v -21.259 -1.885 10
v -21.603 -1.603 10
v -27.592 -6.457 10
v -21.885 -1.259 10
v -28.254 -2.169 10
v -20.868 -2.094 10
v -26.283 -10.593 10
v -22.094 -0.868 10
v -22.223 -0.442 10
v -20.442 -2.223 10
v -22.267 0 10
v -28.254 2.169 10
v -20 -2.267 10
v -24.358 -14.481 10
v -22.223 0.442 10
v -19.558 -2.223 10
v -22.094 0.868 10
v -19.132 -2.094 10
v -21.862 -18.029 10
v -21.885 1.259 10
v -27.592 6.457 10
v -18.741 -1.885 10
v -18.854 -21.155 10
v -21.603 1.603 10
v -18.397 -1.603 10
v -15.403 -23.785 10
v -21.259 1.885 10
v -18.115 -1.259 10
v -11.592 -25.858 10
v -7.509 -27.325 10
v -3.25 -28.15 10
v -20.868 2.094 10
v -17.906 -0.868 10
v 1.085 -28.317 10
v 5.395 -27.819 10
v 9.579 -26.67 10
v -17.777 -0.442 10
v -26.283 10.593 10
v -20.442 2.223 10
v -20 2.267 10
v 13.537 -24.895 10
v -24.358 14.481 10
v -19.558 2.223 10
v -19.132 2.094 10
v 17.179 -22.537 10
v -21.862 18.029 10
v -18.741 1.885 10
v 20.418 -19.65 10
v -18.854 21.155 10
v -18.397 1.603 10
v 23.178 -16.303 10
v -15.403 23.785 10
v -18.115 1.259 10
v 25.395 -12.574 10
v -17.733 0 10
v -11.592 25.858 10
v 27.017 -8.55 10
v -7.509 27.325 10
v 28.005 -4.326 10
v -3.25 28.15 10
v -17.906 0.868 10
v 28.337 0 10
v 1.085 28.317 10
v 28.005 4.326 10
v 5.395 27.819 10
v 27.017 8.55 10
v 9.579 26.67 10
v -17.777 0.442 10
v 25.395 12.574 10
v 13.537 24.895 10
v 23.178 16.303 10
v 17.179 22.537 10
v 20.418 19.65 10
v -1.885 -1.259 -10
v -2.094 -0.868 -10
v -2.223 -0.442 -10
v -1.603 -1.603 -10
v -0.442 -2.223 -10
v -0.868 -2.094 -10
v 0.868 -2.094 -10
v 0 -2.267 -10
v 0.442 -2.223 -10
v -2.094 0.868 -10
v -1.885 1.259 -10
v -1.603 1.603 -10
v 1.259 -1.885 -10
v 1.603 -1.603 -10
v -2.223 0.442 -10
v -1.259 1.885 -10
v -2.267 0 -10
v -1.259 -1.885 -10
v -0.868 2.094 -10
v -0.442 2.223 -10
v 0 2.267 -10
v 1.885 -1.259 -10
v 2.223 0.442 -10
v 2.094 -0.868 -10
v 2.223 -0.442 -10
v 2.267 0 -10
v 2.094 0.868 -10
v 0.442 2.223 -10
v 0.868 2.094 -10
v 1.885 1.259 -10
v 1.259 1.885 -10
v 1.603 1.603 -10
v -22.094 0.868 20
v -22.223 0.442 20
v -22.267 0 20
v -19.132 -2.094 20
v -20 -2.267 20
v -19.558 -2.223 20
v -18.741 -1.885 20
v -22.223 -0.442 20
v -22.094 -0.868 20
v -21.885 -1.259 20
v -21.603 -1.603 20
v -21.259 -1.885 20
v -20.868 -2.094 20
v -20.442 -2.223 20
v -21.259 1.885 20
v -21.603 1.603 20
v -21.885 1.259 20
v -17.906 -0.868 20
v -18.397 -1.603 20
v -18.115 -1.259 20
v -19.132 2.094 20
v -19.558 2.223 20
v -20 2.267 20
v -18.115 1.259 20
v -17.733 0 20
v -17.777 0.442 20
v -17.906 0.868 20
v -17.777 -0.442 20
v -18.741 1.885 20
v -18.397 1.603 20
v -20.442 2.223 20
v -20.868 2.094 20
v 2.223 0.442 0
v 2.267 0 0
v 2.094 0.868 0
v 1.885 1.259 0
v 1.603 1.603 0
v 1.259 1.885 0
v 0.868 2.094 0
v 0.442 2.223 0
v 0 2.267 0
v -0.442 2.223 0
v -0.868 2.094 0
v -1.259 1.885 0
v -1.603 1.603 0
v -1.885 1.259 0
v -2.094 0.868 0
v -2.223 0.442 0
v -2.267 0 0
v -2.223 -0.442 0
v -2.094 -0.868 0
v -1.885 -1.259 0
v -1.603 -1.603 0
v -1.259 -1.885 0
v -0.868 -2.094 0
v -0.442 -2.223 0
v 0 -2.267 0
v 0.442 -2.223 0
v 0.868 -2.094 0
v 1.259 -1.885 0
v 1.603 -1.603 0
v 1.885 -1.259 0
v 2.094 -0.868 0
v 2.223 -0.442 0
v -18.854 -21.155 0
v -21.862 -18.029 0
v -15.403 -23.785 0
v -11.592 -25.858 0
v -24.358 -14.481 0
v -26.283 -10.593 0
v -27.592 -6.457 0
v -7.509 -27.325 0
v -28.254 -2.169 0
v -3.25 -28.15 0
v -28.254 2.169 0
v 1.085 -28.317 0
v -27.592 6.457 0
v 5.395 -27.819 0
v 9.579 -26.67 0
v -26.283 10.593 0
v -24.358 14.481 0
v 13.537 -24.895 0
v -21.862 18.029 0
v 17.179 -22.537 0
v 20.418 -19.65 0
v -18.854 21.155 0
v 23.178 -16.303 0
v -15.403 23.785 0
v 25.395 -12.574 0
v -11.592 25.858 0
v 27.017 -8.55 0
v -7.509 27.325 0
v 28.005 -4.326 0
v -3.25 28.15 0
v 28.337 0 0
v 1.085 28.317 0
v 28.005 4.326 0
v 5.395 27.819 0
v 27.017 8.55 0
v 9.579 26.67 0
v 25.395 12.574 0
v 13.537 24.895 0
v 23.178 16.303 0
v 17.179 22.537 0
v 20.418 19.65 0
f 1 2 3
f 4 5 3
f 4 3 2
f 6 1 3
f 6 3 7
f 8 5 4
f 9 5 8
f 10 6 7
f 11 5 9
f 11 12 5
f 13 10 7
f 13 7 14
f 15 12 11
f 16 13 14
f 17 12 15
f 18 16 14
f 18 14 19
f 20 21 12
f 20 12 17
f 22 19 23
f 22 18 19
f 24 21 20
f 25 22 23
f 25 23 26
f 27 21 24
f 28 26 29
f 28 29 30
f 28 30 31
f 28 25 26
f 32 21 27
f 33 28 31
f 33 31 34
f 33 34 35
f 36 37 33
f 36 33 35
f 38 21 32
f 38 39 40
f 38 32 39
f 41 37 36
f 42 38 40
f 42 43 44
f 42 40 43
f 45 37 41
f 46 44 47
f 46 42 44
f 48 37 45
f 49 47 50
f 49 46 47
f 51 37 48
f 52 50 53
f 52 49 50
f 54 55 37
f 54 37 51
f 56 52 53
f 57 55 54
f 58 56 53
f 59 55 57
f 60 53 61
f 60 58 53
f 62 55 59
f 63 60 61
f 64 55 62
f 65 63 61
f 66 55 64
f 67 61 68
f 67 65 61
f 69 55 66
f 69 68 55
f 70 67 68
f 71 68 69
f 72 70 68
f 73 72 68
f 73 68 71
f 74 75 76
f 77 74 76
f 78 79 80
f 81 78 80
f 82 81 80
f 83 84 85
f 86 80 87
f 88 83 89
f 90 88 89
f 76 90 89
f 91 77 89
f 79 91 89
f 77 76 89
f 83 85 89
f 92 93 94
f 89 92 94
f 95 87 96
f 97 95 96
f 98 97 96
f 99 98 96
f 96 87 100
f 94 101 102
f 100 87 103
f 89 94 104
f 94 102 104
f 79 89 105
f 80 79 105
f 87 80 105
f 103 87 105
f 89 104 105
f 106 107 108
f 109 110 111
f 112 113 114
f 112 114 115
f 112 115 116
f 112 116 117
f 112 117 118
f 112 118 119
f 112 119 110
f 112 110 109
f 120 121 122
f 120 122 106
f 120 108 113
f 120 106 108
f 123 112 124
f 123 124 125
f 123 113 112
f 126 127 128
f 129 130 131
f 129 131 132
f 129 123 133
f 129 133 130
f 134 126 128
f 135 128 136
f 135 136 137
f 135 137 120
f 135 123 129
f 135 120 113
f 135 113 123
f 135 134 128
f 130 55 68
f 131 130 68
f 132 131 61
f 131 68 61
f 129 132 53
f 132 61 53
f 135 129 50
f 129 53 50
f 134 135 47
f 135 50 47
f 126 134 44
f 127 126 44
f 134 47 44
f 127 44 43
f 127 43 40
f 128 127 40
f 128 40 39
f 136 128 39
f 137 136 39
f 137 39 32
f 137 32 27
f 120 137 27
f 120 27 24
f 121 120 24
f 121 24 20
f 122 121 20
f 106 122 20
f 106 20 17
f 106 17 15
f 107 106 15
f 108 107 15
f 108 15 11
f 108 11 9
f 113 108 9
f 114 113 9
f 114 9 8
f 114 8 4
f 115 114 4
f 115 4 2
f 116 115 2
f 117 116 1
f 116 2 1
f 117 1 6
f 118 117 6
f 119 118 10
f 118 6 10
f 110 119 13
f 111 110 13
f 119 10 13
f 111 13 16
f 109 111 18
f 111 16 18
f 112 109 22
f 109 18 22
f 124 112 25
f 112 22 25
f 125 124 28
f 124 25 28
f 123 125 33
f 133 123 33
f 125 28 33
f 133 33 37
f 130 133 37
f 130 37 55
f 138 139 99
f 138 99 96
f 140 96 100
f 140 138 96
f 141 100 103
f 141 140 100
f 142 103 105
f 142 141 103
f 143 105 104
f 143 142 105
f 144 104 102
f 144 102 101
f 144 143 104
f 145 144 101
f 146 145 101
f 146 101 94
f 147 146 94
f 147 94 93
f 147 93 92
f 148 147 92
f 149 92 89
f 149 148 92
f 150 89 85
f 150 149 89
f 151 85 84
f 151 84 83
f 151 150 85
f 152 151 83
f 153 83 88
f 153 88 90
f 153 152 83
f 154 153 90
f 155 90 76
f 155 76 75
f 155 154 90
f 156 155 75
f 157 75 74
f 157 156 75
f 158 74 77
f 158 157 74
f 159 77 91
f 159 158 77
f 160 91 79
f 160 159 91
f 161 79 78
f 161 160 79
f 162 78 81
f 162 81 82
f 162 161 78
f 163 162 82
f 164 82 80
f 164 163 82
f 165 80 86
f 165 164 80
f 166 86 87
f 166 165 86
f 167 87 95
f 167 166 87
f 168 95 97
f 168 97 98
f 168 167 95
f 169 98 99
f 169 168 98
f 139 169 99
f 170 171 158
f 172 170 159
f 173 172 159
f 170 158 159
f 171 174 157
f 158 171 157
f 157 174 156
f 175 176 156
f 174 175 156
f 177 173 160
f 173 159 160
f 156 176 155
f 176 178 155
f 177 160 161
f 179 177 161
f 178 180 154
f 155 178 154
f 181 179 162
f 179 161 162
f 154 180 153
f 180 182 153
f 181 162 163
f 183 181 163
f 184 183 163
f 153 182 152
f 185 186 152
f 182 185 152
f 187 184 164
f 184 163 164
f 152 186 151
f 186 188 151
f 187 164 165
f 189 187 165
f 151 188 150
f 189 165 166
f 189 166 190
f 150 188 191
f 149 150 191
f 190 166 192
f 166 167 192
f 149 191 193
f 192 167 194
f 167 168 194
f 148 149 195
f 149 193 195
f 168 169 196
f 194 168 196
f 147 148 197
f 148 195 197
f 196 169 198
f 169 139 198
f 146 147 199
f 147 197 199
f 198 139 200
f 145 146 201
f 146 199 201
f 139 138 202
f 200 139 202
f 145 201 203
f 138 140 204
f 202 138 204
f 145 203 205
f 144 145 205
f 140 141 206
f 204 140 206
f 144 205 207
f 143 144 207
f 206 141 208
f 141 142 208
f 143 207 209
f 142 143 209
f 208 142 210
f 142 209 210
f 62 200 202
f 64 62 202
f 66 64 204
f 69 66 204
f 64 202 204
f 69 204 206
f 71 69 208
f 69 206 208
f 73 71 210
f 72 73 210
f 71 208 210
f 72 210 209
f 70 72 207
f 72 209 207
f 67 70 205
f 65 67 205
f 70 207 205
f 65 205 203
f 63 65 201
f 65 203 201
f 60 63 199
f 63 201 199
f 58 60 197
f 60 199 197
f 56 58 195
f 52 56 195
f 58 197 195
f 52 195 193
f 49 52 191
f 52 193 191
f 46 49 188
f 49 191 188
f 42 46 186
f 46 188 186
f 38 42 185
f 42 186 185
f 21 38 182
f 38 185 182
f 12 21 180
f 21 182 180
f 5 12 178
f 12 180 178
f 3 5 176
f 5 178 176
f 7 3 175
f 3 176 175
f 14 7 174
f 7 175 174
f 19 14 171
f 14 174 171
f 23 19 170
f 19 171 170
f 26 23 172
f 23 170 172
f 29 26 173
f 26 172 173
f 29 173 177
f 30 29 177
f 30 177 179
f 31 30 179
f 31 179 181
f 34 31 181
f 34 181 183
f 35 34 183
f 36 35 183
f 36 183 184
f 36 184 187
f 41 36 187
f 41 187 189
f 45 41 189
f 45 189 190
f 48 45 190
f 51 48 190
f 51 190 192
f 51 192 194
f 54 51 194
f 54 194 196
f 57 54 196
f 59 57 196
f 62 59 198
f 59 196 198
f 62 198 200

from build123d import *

# Parameters (mm, degrees)
SKETCH1_R           = 28.337466136
SKETCH1_R_2         = 2.266997291
BOSS_EXTRUDE1_DEPTH = 10
SKETCH1_2_R         = 2.266997291
BOSS_EXTRUDE2_DEPTH = 10
SKETCH1_4_R         = 2.266997291
BOSS_EXTRUDE3_DEPTH = 20


with BuildPart() as part:
    # Sketch1 → Boss-Extrude1 (new body)
    with BuildSketch(Plane.XY):
        Circle(SKETCH1_R)
        Circle(SKETCH1_R_2, mode=Mode.SUBTRACT)
        with Locations((-20, 0)):
            Circle(SKETCH1_R_2, mode=Mode.SUBTRACT)
    extrude(amount=BOSS_EXTRUDE1_DEPTH)

    # Sketch1<2> → Boss-Extrude2 (add, symmetric)
    with BuildSketch(Plane.XY):
        Circle(SKETCH1_2_R)
    extrude(amount=BOSS_EXTRUDE2_DEPTH, both=True)

    # Sketch1<4> → Boss-Extrude3 (add)
    with BuildSketch(Plane.XY):
        with Locations((-20, 0)):
            Circle(SKETCH1_4_R)
    extrude(amount=BOSS_EXTRUDE3_DEPTH)


solid = part.part
